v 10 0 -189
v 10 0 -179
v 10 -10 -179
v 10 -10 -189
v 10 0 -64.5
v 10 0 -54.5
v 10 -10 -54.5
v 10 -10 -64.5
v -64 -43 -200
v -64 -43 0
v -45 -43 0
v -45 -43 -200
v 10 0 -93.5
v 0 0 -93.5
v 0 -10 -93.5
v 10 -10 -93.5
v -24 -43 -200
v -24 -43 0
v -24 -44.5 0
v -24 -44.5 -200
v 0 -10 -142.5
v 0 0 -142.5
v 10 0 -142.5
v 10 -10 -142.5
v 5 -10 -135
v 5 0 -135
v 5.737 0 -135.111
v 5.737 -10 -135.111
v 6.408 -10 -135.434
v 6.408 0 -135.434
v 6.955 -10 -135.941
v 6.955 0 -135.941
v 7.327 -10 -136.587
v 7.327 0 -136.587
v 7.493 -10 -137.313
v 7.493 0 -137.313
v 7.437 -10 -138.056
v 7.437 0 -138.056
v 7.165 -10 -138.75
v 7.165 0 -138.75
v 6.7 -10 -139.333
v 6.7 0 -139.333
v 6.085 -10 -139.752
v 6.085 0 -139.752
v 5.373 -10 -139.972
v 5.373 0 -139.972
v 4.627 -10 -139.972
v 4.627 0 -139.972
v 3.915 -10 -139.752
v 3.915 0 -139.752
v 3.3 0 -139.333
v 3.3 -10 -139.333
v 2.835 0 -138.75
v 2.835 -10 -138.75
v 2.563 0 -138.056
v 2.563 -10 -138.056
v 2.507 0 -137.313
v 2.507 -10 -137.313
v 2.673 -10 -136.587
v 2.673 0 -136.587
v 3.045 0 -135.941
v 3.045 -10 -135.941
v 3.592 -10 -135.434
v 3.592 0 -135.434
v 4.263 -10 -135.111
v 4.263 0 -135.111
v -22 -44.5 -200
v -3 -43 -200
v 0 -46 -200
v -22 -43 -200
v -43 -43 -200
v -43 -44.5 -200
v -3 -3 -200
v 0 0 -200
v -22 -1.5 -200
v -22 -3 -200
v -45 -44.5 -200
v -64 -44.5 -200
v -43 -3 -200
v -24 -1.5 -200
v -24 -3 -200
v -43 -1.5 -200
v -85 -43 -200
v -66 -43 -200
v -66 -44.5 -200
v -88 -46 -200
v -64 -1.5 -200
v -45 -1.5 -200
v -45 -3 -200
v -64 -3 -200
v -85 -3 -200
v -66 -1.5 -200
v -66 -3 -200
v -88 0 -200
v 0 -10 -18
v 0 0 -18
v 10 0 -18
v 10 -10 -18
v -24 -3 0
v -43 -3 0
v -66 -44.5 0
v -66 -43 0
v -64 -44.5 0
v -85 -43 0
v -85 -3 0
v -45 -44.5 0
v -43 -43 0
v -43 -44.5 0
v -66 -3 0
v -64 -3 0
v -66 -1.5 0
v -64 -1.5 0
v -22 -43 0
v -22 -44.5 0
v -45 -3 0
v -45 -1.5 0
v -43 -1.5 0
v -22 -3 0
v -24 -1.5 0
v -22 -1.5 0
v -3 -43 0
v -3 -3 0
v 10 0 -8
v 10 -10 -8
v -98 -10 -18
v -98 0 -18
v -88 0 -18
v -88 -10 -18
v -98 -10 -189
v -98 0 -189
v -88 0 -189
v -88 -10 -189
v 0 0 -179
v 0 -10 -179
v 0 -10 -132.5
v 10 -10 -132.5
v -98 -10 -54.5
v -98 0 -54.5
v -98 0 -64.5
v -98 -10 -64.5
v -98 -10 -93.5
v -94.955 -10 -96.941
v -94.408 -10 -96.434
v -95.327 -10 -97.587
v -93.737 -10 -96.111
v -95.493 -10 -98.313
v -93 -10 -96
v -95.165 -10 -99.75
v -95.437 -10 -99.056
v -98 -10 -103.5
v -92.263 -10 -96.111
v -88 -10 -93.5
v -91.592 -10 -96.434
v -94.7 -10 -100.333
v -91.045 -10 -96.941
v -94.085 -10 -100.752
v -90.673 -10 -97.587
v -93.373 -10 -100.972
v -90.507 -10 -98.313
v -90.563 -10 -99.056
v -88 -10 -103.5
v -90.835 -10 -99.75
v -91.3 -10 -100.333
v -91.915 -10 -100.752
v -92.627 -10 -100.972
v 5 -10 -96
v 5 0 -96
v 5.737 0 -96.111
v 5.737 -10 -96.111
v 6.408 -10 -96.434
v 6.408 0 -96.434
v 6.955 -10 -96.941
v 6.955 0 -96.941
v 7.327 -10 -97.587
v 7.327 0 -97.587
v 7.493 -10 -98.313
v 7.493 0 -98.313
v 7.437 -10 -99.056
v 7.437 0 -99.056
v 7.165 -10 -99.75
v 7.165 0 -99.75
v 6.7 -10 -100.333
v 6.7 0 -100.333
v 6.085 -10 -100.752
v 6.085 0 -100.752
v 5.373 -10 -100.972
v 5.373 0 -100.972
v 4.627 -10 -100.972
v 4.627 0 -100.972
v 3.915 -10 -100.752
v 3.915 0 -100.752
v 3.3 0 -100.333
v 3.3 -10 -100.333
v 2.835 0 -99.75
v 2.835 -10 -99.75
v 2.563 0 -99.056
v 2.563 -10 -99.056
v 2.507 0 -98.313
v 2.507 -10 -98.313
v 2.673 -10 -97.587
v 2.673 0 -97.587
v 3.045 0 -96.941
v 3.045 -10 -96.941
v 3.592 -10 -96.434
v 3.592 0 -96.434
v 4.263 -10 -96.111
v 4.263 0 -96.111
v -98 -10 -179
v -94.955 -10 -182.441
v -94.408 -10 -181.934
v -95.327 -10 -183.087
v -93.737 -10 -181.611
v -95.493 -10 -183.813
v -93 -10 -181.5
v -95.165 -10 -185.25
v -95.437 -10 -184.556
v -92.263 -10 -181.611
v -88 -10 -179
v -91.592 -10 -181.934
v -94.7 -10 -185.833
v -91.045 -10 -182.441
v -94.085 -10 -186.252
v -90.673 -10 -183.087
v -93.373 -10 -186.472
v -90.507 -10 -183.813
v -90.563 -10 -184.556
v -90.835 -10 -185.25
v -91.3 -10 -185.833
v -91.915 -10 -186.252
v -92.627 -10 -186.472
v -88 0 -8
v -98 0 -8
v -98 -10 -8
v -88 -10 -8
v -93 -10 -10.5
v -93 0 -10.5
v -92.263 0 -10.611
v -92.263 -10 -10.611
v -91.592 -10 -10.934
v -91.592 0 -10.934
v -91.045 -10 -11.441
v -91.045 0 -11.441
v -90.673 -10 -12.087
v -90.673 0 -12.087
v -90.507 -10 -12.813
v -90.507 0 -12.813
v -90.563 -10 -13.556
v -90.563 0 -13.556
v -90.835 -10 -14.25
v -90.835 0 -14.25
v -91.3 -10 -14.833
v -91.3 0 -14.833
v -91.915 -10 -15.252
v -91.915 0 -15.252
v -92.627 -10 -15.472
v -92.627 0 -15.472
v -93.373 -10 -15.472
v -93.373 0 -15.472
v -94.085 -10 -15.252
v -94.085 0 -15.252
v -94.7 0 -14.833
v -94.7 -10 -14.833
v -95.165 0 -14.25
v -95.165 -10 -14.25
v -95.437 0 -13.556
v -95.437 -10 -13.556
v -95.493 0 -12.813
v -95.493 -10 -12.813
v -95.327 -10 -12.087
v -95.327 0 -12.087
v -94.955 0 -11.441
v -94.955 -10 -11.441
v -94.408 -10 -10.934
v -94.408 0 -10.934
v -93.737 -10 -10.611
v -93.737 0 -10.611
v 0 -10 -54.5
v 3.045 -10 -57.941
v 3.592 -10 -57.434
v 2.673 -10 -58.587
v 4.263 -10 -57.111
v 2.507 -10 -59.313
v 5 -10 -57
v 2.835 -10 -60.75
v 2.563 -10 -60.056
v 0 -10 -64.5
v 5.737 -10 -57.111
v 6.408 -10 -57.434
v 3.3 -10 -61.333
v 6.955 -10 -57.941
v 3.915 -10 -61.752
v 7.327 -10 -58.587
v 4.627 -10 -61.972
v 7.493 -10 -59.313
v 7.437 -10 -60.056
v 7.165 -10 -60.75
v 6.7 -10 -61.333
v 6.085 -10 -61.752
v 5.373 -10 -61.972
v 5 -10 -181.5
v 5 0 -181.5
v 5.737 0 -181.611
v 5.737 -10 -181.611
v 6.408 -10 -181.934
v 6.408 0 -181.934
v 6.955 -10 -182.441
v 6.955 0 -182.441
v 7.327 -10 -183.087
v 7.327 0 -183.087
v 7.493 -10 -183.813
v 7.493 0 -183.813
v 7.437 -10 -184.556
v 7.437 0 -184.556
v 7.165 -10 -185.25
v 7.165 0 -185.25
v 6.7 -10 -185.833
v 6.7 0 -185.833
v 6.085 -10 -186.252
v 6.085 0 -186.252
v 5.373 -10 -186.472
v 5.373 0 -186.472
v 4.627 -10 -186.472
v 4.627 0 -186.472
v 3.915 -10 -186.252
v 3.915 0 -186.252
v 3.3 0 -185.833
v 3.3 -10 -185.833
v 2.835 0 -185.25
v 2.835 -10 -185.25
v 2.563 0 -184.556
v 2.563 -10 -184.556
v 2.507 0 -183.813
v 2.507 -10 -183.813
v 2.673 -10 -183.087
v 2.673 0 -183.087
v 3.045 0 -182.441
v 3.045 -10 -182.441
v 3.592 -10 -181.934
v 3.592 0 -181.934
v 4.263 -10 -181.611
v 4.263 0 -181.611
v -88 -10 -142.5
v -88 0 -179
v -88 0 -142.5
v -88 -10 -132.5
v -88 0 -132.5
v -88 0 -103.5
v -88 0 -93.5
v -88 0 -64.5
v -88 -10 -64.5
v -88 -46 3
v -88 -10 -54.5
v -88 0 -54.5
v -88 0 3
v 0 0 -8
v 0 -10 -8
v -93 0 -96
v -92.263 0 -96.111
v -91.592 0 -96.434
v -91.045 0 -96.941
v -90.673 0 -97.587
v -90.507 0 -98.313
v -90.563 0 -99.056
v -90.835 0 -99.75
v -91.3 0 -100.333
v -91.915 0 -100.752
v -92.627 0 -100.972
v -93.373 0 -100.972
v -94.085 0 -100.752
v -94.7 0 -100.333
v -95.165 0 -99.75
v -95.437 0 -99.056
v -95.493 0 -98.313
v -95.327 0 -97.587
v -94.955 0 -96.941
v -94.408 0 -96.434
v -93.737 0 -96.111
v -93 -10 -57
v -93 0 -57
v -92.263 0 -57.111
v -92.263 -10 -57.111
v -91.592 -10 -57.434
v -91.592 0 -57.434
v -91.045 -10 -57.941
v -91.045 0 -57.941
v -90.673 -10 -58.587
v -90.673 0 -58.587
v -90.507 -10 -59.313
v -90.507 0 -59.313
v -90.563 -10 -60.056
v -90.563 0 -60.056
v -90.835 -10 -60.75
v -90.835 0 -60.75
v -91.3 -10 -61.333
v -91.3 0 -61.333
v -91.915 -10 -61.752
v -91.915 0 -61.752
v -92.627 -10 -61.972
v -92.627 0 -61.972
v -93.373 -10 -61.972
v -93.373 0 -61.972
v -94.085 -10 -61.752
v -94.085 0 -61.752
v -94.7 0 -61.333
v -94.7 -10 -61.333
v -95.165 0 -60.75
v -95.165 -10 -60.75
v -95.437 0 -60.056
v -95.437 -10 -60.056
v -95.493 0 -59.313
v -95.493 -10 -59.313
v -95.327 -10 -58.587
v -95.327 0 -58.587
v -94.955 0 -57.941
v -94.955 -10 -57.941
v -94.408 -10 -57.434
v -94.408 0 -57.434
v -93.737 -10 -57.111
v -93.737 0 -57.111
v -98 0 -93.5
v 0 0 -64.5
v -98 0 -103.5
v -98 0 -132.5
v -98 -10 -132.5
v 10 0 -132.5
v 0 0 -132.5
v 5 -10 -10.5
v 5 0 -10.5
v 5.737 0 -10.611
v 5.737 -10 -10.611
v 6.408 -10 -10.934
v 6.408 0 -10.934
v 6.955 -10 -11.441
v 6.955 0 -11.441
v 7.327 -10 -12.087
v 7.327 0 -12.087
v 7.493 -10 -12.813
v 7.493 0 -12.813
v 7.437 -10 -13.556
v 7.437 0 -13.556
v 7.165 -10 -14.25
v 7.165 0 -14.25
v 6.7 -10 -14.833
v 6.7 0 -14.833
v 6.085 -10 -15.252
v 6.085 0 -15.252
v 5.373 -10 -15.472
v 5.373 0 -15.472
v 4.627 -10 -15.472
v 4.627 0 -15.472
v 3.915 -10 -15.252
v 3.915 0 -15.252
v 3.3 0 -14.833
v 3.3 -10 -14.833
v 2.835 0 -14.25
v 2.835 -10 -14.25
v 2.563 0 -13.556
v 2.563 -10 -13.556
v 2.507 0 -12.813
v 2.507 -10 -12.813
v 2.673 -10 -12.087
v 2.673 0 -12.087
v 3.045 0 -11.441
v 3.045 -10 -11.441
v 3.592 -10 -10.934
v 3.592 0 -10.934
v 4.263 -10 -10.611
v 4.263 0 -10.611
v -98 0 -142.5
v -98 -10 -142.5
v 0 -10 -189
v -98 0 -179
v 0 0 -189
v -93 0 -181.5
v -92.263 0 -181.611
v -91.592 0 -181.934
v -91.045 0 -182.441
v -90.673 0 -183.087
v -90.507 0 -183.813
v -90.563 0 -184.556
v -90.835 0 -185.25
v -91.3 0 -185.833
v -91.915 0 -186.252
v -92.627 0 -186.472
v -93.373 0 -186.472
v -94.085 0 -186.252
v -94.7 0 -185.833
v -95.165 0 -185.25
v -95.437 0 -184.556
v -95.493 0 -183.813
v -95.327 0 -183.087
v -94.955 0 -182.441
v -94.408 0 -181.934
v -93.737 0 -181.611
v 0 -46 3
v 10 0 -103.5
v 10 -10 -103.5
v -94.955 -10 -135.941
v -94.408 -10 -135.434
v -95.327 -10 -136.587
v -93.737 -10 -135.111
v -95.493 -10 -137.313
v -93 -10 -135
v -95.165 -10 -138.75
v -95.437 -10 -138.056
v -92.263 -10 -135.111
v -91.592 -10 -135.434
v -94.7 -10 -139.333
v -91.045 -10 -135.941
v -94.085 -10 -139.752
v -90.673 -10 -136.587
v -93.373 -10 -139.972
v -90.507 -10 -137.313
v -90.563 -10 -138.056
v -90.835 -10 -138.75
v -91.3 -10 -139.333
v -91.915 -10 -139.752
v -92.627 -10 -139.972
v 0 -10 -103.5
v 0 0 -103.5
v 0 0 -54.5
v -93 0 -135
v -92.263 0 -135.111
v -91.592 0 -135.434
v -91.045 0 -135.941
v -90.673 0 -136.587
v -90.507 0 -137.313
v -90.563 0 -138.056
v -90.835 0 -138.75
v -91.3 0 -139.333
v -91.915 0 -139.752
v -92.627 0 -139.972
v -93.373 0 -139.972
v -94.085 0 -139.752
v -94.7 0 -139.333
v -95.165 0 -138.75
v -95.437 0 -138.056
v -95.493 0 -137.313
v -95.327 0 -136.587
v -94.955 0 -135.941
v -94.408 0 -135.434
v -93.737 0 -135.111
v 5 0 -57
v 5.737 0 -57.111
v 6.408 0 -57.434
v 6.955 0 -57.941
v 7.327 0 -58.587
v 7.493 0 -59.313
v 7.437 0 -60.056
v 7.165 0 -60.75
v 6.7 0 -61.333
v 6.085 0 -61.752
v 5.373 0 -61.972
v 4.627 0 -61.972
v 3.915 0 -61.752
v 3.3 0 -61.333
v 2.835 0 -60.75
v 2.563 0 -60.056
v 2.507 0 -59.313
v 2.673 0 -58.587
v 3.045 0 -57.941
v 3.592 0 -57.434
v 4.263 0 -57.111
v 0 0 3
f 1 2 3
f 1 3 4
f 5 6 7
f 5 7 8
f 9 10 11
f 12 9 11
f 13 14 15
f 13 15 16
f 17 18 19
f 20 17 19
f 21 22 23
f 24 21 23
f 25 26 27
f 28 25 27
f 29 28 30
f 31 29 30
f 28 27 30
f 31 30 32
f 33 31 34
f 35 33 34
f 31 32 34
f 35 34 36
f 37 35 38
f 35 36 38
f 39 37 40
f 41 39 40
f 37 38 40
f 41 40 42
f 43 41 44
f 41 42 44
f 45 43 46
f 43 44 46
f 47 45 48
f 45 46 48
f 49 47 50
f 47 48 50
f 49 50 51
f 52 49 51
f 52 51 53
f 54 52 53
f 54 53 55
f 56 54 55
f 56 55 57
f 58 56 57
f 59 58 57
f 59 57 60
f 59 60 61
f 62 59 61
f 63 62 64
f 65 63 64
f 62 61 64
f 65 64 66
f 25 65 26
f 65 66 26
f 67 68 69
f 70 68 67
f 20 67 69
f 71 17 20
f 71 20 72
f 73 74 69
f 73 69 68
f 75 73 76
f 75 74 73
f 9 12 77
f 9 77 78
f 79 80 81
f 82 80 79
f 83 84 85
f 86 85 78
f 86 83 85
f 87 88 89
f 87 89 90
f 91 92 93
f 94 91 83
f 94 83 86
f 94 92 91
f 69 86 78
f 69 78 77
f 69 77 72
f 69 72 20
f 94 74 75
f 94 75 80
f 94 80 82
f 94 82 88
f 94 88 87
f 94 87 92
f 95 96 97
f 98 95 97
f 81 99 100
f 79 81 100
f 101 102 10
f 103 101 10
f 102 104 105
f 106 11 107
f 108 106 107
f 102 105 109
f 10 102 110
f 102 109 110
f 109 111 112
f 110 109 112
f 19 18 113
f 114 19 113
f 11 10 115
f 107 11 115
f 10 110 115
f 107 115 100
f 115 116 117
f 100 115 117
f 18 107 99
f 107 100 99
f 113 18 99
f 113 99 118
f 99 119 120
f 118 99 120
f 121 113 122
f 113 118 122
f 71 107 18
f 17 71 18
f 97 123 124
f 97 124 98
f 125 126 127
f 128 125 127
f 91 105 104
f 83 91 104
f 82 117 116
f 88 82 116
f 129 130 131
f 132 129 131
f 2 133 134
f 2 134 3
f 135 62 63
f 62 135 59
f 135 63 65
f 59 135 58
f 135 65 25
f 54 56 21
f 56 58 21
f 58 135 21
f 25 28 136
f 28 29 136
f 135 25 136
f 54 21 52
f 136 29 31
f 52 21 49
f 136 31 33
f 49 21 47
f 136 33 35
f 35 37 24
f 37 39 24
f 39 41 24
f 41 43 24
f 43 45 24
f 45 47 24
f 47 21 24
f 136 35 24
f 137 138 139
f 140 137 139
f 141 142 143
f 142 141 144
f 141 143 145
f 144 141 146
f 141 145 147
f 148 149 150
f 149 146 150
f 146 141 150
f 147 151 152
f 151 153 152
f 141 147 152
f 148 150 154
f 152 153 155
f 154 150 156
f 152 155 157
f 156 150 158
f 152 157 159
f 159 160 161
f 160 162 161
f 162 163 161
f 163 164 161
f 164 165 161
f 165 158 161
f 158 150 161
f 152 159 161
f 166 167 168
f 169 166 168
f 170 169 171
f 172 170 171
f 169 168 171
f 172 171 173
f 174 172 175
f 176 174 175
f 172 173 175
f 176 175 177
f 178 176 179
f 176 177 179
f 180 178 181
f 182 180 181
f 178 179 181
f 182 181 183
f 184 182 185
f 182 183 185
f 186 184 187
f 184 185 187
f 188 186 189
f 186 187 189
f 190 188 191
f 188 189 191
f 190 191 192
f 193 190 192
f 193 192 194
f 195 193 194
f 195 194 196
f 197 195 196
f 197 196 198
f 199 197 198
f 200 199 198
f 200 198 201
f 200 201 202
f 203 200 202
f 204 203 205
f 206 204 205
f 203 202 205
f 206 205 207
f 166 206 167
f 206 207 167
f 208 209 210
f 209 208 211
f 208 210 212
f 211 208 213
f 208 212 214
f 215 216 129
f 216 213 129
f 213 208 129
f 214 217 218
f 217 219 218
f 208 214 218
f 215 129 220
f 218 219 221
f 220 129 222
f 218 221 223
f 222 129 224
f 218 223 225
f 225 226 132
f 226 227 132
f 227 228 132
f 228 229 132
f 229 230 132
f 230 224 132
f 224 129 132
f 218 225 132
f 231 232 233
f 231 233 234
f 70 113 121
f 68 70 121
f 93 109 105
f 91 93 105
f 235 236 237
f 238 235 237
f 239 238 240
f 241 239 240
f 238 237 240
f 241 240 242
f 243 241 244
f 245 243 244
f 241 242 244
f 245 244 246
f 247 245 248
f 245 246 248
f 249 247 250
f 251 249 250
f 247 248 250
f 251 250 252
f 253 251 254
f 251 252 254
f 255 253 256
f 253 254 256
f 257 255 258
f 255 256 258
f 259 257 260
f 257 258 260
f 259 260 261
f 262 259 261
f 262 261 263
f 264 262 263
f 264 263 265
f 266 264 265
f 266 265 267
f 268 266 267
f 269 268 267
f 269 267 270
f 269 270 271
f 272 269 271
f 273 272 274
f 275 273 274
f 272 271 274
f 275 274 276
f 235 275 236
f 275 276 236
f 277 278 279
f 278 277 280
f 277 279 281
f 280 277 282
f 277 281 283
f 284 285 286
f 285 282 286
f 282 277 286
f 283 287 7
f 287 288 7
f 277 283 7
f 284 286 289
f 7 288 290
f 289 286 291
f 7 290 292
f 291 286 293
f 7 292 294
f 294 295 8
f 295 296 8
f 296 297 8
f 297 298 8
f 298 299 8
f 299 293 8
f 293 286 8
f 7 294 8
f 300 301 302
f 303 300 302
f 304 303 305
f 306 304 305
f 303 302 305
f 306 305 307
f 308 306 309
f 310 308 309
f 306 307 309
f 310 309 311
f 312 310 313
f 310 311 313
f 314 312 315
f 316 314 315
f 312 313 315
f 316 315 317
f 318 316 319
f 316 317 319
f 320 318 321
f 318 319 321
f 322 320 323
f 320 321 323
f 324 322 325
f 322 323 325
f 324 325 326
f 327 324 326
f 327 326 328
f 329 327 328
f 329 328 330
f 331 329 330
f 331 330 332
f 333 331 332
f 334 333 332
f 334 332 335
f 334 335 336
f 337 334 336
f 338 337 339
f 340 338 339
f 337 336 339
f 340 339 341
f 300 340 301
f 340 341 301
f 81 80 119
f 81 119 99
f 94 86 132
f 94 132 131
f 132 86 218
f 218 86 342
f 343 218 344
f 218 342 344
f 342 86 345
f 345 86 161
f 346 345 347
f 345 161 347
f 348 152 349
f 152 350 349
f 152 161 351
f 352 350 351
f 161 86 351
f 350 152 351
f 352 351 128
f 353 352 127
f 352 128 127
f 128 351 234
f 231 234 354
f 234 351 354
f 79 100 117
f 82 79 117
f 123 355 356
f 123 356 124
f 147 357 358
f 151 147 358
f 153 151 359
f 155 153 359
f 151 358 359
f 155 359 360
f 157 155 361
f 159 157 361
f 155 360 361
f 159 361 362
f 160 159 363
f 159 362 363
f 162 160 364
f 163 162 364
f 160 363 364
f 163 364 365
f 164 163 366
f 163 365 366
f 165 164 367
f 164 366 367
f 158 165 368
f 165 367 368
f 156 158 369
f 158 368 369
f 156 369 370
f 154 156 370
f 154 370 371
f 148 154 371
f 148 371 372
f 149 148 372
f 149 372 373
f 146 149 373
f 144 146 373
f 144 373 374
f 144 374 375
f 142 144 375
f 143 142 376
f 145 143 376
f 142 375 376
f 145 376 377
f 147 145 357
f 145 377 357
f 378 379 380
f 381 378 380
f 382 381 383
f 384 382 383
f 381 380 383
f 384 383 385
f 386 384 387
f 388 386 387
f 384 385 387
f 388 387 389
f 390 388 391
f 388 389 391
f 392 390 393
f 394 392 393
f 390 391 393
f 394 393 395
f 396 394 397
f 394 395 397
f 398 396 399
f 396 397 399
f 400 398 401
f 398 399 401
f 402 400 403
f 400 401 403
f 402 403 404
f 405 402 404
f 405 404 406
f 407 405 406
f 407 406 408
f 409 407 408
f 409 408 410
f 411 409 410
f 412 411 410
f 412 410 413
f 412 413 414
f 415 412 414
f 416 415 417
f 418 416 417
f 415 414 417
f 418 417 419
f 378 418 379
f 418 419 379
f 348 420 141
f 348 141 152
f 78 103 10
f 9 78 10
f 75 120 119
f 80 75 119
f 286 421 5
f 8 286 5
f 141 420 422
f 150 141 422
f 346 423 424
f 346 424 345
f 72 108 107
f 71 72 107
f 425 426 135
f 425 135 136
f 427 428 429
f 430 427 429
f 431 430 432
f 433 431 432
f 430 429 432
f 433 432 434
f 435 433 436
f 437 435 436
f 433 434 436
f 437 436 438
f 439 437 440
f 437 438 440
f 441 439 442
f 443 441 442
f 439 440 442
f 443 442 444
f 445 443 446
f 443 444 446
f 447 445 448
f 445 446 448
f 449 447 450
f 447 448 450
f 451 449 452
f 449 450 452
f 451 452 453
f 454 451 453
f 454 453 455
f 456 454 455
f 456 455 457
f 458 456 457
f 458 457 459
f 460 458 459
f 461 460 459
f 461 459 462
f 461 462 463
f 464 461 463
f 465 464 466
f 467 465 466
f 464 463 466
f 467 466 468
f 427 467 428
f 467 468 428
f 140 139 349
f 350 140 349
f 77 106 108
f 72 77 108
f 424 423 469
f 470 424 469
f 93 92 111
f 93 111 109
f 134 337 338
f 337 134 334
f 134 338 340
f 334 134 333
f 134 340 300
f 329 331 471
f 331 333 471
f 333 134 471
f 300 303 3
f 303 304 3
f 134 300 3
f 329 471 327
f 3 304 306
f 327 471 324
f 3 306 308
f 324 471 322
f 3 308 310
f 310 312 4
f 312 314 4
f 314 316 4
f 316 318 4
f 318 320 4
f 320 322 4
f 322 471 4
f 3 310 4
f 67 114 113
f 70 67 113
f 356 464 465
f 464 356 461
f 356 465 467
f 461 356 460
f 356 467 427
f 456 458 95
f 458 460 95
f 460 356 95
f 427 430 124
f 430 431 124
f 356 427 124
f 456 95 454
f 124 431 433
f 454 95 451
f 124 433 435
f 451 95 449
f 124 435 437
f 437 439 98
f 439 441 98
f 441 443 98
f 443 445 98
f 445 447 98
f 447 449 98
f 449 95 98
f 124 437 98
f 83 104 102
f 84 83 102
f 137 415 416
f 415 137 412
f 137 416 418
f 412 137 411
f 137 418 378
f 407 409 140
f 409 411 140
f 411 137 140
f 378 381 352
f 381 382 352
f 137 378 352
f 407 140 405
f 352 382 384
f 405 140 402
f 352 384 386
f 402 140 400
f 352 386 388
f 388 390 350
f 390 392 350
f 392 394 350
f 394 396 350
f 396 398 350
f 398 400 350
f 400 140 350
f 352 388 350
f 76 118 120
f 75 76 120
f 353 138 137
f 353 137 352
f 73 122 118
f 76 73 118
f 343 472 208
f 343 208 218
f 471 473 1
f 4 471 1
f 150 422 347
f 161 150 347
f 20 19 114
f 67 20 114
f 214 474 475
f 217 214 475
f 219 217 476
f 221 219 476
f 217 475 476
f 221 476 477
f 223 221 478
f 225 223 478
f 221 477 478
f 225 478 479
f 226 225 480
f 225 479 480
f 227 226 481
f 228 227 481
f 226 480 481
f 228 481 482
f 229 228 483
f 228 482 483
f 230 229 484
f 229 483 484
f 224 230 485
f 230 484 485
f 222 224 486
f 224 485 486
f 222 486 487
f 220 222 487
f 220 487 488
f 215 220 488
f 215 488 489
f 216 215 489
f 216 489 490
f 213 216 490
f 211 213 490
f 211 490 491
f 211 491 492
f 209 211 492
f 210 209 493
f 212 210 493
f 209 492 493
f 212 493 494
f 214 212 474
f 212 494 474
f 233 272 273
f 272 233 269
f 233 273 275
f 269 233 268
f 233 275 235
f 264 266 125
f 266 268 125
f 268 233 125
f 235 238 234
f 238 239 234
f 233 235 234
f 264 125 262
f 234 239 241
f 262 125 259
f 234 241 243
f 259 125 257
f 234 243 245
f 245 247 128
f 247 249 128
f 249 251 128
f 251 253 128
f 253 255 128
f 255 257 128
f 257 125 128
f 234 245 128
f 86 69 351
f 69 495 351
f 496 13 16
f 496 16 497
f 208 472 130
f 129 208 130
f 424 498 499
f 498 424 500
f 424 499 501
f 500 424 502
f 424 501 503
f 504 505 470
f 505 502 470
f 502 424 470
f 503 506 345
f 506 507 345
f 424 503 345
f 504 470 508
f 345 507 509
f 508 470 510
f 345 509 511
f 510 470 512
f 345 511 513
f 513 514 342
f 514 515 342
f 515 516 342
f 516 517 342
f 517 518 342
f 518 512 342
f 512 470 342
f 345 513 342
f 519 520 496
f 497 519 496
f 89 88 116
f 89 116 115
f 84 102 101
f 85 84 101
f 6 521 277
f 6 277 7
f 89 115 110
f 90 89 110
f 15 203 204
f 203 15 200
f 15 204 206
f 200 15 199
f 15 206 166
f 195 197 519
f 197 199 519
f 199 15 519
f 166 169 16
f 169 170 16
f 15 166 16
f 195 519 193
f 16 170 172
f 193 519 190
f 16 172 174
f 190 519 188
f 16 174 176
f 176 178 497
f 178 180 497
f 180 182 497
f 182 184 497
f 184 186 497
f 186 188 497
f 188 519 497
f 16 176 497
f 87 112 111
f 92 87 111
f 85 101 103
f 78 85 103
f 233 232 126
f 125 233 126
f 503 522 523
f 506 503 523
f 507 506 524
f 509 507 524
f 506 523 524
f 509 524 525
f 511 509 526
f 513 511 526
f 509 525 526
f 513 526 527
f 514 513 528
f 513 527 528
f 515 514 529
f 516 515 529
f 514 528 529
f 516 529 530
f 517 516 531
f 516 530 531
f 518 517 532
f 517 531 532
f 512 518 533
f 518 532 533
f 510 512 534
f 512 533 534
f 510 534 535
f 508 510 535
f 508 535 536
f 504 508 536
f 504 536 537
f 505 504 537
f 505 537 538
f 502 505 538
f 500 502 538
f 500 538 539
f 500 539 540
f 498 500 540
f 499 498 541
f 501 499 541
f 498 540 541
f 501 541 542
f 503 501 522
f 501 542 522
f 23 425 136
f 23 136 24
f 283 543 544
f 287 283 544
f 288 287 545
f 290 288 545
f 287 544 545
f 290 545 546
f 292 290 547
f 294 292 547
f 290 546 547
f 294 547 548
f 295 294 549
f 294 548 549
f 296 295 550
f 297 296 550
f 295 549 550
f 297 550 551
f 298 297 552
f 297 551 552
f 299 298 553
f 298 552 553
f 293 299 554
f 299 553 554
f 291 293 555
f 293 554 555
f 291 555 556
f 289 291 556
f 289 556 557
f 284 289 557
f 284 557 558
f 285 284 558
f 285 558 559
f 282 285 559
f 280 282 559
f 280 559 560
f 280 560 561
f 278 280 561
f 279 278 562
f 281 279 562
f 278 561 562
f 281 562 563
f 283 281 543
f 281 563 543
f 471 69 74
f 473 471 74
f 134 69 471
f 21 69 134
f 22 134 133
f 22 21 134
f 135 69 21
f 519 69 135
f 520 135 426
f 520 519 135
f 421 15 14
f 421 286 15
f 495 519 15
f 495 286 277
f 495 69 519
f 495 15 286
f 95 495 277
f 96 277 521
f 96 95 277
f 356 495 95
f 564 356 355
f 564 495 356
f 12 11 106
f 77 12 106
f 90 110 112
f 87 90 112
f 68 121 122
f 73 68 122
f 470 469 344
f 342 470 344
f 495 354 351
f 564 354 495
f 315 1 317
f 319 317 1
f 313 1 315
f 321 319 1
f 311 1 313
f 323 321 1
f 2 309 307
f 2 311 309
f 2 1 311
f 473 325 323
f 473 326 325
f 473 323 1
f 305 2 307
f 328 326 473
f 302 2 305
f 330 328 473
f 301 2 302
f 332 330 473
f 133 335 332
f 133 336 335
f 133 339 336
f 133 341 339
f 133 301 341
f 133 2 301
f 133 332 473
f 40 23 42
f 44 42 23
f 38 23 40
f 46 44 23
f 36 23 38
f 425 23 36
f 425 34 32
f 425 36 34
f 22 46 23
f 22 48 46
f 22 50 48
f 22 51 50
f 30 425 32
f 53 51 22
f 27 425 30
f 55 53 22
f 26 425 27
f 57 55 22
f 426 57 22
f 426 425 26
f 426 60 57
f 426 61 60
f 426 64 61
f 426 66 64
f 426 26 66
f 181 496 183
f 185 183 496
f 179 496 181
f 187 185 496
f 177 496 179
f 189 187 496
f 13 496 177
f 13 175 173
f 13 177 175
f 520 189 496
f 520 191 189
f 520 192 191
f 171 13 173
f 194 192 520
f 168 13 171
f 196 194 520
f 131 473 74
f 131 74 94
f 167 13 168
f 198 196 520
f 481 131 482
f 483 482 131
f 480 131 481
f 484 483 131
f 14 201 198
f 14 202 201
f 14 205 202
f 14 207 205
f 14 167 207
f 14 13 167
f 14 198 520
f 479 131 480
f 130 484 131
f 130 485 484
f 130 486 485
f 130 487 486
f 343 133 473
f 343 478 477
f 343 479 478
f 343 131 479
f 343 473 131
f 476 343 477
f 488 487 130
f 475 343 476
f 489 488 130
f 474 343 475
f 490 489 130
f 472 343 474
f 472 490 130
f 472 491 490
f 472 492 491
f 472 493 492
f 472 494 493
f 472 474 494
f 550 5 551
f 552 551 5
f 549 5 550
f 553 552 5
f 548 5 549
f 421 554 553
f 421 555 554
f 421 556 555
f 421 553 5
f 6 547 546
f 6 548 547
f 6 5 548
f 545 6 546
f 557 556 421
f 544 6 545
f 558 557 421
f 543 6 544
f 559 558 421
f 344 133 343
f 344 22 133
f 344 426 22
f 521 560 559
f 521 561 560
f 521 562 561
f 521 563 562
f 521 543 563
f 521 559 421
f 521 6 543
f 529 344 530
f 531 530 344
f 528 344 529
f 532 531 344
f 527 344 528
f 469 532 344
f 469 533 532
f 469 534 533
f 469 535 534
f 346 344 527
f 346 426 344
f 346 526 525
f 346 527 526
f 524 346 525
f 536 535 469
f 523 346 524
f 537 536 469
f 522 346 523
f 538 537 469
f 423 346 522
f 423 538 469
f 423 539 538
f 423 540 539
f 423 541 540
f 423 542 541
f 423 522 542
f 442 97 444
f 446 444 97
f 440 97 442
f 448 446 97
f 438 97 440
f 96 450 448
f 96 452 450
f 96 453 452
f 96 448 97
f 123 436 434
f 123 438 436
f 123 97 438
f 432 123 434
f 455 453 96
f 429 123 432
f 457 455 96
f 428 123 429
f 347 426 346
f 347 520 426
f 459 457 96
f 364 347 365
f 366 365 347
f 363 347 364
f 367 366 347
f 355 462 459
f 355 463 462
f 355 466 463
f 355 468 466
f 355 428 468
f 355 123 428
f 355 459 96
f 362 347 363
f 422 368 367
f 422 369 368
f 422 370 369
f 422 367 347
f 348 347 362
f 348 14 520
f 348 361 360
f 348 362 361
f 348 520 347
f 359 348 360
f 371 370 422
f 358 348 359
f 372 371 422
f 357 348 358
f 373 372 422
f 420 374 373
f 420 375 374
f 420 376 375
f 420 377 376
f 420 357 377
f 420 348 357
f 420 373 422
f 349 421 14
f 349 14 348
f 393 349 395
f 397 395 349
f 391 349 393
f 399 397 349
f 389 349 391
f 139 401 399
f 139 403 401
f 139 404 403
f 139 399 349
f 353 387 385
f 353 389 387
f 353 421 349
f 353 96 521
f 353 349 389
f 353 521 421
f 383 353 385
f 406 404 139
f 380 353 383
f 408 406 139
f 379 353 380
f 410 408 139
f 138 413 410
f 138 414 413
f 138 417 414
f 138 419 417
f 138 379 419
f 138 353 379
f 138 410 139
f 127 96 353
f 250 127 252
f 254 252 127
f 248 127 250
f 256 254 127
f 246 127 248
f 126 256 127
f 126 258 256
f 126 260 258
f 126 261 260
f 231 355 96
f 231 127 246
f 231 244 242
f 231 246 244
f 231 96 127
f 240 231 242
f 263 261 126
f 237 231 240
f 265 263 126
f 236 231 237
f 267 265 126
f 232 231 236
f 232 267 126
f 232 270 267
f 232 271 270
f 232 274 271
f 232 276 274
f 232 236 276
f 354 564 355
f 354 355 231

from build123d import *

# Parameters (mm, degrees)
SKETCH1_W           = 88
SKETCH1_H           = 46
SKETCH1_W_2         = 82
SKETCH1_H_2         = 40
BOSS_EXTRUDE1_DEPTH = 3
SKETCH3_W           = 88
SKETCH3_H           = 46
BOSS_EXTRUDE2_DEPTH = 200
SKETCH6_W           = 10
SKETCH6_H           = 10
SKETCH6_R           = 2.5
BOSS_EXTRUDE4_DEPTH = 10


with BuildPart() as part:
    # Sketch1 → Boss-Extrude1 (new body)
    # profile 1 of 2: a face of its own
    with BuildSketch(Plane.XY):
        with Locations((-44, -23)):
            Rectangle(SKETCH1_W, SKETCH1_H)
        with Locations((-44, -23)):
            Rectangle(SKETCH1_W_2, SKETCH1_H_2, mode=Mode.SUBTRACT)
    # profile 2 of 2: a face of its own
    with BuildSketch(Plane.XY):
        with Locations((-44, -23)):
            Rectangle(SKETCH1_W_2, SKETCH1_H_2)
    extrude(amount=BOSS_EXTRUDE1_DEPTH)

    # Sketch3 → Boss-Extrude2 (add)
    with BuildSketch(Plane(origin=(0, 0, 0), x_dir=(-1, 0, 0), z_dir=(0, 0, -1))):
        with Locations((44, -23)):
            Rectangle(SKETCH3_W, SKETCH3_H)
        Polygon((24, -3), (43, -3), (43, -1.5), (45, -1.5), (45, -3), (64, -3), (64, -1.5), (66, -1.5), (66, -3), (85, -3), (85, -43), (66, -43), (66, -44.5), (64, -44.5), (64, -43), (45, -43), (45, -44.5), (43, -44.5), (43, -43), (24, -43), (24, -44.5), (22, -44.5), (22, -43), (3, -43), (3, -3), (22, -3), (22, -1.5), (24, -1.5), align=None, mode=Mode.SUBTRACT)
    extrude(amount=BOSS_EXTRUDE2_DEPTH)

    # Sketch6 → Boss-Extrude4 (add)
    # profile 1 of 10: a face of its own
    with BuildSketch(Plane(origin=(0, 0, 0), x_dir=(1, 0, 0), z_dir=(0, 1, 0))):
        with Locations((-93, 98.5)):
            Rectangle(SKETCH6_W, SKETCH6_H)
        with Locations(Location((-93, 98.5, 0), (0, 0, 270))):
            Circle(SKETCH6_R, mode=Mode.SUBTRACT)
    # profile 2 of 10: a face of its own
    with BuildSketch(Plane(origin=(0, 0, 0), x_dir=(1, 0, 0), z_dir=(0, 1, 0))):
        with Locations((5, 98.5)):
            Rectangle(SKETCH6_W, SKETCH6_H)
        with Locations(Location((5, 98.5, 0), (0, 0, 270))):
            Circle(SKETCH6_R, mode=Mode.SUBTRACT)
    # profile 3 of 10: a face of its own
    with BuildSketch(Plane(origin=(0, 0, 0), x_dir=(1, 0, 0), z_dir=(0, 1, 0))):
        with Locations((-93, 137.5)):
            Rectangle(SKETCH6_W, SKETCH6_H)
        with Locations(Location((-93, 137.5, 0), (0, 0, 270))):
            Circle(SKETCH6_R, mode=Mode.SUBTRACT)
    # profile 4 of 10: a face of its own
    with BuildSketch(Plane(origin=(0, 0, 0), x_dir=(1, 0, 0), z_dir=(0, 1, 0))):
        with Locations((5, 137.5)):
            Rectangle(SKETCH6_W, SKETCH6_H)
        with Locations(Location((5, 137.5, 0), (0, 0, 270))):
            Circle(SKETCH6_R, mode=Mode.SUBTRACT)
    # profile 5 of 10: a face of its own
    with BuildSketch(Plane(origin=(0, 0, 0), x_dir=(1, 0, 0), z_dir=(0, 1, 0))):
        with Locations((-93, 59.5)):
            Rectangle(SKETCH6_W, SKETCH6_H)
        with Locations(Location((-93, 59.5, 0), (0, 0, 270))):
            Circle(SKETCH6_R, mode=Mode.SUBTRACT)
    # profile 6 of 10: a face of its own
    with BuildSketch(Plane(origin=(0, 0, 0), x_dir=(1, 0, 0), z_dir=(0, 1, 0))):
        with Locations((5, 59.5)):
            Rectangle(SKETCH6_W, SKETCH6_H)
        with Locations(Location((5, 59.5, 0), (0, 0, 270))):
            Circle(SKETCH6_R, mode=Mode.SUBTRACT)
    # profile 7 of 10: a face of its own
    with BuildSketch(Plane(origin=(0, 0, 0), x_dir=(1, 0, 0), z_dir=(0, 1, 0))):
        with Locations((-93, 13)):
            Rectangle(SKETCH6_W, SKETCH6_H)
        with Locations(Location((-93, 13, 0), (0, 0, 270))):
            Circle(SKETCH6_R, mode=Mode.SUBTRACT)
    # profile 8 of 10: a face of its own
    with BuildSketch(Plane(origin=(0, 0, 0), x_dir=(1, 0, 0), z_dir=(0, 1, 0))):
        with Locations((5, 13)):
            Rectangle(SKETCH6_W, SKETCH6_H)
        with Locations(Location((5, 13, 0), (0, 0, 270))):
            Circle(SKETCH6_R, mode=Mode.SUBTRACT)
    # profile 9 of 10: a face of its own
    with BuildSketch(Plane(origin=(0, 0, 0), x_dir=(1, 0, 0), z_dir=(0, 1, 0))):
        with Locations((5, 184)):
            Rectangle(SKETCH6_W, SKETCH6_H)
        with Locations(Location((5, 184, 0), (0, 0, 270))):
            Circle(SKETCH6_R, mode=Mode.SUBTRACT)
    # profile 10 of 10: a face of its own
    with BuildSketch(Plane(origin=(0, 0, 0), x_dir=(1, 0, 0), z_dir=(0, 1, 0))):
        with Locations((-93, 184)):
            Rectangle(SKETCH6_W, SKETCH6_H)
        with Locations(Location((-93, 184, 0), (0, 0, 270))):
            Circle(SKETCH6_R, mode=Mode.SUBTRACT)
    extrude(amount=-BOSS_EXTRUDE4_DEPTH)


solid = part.part
